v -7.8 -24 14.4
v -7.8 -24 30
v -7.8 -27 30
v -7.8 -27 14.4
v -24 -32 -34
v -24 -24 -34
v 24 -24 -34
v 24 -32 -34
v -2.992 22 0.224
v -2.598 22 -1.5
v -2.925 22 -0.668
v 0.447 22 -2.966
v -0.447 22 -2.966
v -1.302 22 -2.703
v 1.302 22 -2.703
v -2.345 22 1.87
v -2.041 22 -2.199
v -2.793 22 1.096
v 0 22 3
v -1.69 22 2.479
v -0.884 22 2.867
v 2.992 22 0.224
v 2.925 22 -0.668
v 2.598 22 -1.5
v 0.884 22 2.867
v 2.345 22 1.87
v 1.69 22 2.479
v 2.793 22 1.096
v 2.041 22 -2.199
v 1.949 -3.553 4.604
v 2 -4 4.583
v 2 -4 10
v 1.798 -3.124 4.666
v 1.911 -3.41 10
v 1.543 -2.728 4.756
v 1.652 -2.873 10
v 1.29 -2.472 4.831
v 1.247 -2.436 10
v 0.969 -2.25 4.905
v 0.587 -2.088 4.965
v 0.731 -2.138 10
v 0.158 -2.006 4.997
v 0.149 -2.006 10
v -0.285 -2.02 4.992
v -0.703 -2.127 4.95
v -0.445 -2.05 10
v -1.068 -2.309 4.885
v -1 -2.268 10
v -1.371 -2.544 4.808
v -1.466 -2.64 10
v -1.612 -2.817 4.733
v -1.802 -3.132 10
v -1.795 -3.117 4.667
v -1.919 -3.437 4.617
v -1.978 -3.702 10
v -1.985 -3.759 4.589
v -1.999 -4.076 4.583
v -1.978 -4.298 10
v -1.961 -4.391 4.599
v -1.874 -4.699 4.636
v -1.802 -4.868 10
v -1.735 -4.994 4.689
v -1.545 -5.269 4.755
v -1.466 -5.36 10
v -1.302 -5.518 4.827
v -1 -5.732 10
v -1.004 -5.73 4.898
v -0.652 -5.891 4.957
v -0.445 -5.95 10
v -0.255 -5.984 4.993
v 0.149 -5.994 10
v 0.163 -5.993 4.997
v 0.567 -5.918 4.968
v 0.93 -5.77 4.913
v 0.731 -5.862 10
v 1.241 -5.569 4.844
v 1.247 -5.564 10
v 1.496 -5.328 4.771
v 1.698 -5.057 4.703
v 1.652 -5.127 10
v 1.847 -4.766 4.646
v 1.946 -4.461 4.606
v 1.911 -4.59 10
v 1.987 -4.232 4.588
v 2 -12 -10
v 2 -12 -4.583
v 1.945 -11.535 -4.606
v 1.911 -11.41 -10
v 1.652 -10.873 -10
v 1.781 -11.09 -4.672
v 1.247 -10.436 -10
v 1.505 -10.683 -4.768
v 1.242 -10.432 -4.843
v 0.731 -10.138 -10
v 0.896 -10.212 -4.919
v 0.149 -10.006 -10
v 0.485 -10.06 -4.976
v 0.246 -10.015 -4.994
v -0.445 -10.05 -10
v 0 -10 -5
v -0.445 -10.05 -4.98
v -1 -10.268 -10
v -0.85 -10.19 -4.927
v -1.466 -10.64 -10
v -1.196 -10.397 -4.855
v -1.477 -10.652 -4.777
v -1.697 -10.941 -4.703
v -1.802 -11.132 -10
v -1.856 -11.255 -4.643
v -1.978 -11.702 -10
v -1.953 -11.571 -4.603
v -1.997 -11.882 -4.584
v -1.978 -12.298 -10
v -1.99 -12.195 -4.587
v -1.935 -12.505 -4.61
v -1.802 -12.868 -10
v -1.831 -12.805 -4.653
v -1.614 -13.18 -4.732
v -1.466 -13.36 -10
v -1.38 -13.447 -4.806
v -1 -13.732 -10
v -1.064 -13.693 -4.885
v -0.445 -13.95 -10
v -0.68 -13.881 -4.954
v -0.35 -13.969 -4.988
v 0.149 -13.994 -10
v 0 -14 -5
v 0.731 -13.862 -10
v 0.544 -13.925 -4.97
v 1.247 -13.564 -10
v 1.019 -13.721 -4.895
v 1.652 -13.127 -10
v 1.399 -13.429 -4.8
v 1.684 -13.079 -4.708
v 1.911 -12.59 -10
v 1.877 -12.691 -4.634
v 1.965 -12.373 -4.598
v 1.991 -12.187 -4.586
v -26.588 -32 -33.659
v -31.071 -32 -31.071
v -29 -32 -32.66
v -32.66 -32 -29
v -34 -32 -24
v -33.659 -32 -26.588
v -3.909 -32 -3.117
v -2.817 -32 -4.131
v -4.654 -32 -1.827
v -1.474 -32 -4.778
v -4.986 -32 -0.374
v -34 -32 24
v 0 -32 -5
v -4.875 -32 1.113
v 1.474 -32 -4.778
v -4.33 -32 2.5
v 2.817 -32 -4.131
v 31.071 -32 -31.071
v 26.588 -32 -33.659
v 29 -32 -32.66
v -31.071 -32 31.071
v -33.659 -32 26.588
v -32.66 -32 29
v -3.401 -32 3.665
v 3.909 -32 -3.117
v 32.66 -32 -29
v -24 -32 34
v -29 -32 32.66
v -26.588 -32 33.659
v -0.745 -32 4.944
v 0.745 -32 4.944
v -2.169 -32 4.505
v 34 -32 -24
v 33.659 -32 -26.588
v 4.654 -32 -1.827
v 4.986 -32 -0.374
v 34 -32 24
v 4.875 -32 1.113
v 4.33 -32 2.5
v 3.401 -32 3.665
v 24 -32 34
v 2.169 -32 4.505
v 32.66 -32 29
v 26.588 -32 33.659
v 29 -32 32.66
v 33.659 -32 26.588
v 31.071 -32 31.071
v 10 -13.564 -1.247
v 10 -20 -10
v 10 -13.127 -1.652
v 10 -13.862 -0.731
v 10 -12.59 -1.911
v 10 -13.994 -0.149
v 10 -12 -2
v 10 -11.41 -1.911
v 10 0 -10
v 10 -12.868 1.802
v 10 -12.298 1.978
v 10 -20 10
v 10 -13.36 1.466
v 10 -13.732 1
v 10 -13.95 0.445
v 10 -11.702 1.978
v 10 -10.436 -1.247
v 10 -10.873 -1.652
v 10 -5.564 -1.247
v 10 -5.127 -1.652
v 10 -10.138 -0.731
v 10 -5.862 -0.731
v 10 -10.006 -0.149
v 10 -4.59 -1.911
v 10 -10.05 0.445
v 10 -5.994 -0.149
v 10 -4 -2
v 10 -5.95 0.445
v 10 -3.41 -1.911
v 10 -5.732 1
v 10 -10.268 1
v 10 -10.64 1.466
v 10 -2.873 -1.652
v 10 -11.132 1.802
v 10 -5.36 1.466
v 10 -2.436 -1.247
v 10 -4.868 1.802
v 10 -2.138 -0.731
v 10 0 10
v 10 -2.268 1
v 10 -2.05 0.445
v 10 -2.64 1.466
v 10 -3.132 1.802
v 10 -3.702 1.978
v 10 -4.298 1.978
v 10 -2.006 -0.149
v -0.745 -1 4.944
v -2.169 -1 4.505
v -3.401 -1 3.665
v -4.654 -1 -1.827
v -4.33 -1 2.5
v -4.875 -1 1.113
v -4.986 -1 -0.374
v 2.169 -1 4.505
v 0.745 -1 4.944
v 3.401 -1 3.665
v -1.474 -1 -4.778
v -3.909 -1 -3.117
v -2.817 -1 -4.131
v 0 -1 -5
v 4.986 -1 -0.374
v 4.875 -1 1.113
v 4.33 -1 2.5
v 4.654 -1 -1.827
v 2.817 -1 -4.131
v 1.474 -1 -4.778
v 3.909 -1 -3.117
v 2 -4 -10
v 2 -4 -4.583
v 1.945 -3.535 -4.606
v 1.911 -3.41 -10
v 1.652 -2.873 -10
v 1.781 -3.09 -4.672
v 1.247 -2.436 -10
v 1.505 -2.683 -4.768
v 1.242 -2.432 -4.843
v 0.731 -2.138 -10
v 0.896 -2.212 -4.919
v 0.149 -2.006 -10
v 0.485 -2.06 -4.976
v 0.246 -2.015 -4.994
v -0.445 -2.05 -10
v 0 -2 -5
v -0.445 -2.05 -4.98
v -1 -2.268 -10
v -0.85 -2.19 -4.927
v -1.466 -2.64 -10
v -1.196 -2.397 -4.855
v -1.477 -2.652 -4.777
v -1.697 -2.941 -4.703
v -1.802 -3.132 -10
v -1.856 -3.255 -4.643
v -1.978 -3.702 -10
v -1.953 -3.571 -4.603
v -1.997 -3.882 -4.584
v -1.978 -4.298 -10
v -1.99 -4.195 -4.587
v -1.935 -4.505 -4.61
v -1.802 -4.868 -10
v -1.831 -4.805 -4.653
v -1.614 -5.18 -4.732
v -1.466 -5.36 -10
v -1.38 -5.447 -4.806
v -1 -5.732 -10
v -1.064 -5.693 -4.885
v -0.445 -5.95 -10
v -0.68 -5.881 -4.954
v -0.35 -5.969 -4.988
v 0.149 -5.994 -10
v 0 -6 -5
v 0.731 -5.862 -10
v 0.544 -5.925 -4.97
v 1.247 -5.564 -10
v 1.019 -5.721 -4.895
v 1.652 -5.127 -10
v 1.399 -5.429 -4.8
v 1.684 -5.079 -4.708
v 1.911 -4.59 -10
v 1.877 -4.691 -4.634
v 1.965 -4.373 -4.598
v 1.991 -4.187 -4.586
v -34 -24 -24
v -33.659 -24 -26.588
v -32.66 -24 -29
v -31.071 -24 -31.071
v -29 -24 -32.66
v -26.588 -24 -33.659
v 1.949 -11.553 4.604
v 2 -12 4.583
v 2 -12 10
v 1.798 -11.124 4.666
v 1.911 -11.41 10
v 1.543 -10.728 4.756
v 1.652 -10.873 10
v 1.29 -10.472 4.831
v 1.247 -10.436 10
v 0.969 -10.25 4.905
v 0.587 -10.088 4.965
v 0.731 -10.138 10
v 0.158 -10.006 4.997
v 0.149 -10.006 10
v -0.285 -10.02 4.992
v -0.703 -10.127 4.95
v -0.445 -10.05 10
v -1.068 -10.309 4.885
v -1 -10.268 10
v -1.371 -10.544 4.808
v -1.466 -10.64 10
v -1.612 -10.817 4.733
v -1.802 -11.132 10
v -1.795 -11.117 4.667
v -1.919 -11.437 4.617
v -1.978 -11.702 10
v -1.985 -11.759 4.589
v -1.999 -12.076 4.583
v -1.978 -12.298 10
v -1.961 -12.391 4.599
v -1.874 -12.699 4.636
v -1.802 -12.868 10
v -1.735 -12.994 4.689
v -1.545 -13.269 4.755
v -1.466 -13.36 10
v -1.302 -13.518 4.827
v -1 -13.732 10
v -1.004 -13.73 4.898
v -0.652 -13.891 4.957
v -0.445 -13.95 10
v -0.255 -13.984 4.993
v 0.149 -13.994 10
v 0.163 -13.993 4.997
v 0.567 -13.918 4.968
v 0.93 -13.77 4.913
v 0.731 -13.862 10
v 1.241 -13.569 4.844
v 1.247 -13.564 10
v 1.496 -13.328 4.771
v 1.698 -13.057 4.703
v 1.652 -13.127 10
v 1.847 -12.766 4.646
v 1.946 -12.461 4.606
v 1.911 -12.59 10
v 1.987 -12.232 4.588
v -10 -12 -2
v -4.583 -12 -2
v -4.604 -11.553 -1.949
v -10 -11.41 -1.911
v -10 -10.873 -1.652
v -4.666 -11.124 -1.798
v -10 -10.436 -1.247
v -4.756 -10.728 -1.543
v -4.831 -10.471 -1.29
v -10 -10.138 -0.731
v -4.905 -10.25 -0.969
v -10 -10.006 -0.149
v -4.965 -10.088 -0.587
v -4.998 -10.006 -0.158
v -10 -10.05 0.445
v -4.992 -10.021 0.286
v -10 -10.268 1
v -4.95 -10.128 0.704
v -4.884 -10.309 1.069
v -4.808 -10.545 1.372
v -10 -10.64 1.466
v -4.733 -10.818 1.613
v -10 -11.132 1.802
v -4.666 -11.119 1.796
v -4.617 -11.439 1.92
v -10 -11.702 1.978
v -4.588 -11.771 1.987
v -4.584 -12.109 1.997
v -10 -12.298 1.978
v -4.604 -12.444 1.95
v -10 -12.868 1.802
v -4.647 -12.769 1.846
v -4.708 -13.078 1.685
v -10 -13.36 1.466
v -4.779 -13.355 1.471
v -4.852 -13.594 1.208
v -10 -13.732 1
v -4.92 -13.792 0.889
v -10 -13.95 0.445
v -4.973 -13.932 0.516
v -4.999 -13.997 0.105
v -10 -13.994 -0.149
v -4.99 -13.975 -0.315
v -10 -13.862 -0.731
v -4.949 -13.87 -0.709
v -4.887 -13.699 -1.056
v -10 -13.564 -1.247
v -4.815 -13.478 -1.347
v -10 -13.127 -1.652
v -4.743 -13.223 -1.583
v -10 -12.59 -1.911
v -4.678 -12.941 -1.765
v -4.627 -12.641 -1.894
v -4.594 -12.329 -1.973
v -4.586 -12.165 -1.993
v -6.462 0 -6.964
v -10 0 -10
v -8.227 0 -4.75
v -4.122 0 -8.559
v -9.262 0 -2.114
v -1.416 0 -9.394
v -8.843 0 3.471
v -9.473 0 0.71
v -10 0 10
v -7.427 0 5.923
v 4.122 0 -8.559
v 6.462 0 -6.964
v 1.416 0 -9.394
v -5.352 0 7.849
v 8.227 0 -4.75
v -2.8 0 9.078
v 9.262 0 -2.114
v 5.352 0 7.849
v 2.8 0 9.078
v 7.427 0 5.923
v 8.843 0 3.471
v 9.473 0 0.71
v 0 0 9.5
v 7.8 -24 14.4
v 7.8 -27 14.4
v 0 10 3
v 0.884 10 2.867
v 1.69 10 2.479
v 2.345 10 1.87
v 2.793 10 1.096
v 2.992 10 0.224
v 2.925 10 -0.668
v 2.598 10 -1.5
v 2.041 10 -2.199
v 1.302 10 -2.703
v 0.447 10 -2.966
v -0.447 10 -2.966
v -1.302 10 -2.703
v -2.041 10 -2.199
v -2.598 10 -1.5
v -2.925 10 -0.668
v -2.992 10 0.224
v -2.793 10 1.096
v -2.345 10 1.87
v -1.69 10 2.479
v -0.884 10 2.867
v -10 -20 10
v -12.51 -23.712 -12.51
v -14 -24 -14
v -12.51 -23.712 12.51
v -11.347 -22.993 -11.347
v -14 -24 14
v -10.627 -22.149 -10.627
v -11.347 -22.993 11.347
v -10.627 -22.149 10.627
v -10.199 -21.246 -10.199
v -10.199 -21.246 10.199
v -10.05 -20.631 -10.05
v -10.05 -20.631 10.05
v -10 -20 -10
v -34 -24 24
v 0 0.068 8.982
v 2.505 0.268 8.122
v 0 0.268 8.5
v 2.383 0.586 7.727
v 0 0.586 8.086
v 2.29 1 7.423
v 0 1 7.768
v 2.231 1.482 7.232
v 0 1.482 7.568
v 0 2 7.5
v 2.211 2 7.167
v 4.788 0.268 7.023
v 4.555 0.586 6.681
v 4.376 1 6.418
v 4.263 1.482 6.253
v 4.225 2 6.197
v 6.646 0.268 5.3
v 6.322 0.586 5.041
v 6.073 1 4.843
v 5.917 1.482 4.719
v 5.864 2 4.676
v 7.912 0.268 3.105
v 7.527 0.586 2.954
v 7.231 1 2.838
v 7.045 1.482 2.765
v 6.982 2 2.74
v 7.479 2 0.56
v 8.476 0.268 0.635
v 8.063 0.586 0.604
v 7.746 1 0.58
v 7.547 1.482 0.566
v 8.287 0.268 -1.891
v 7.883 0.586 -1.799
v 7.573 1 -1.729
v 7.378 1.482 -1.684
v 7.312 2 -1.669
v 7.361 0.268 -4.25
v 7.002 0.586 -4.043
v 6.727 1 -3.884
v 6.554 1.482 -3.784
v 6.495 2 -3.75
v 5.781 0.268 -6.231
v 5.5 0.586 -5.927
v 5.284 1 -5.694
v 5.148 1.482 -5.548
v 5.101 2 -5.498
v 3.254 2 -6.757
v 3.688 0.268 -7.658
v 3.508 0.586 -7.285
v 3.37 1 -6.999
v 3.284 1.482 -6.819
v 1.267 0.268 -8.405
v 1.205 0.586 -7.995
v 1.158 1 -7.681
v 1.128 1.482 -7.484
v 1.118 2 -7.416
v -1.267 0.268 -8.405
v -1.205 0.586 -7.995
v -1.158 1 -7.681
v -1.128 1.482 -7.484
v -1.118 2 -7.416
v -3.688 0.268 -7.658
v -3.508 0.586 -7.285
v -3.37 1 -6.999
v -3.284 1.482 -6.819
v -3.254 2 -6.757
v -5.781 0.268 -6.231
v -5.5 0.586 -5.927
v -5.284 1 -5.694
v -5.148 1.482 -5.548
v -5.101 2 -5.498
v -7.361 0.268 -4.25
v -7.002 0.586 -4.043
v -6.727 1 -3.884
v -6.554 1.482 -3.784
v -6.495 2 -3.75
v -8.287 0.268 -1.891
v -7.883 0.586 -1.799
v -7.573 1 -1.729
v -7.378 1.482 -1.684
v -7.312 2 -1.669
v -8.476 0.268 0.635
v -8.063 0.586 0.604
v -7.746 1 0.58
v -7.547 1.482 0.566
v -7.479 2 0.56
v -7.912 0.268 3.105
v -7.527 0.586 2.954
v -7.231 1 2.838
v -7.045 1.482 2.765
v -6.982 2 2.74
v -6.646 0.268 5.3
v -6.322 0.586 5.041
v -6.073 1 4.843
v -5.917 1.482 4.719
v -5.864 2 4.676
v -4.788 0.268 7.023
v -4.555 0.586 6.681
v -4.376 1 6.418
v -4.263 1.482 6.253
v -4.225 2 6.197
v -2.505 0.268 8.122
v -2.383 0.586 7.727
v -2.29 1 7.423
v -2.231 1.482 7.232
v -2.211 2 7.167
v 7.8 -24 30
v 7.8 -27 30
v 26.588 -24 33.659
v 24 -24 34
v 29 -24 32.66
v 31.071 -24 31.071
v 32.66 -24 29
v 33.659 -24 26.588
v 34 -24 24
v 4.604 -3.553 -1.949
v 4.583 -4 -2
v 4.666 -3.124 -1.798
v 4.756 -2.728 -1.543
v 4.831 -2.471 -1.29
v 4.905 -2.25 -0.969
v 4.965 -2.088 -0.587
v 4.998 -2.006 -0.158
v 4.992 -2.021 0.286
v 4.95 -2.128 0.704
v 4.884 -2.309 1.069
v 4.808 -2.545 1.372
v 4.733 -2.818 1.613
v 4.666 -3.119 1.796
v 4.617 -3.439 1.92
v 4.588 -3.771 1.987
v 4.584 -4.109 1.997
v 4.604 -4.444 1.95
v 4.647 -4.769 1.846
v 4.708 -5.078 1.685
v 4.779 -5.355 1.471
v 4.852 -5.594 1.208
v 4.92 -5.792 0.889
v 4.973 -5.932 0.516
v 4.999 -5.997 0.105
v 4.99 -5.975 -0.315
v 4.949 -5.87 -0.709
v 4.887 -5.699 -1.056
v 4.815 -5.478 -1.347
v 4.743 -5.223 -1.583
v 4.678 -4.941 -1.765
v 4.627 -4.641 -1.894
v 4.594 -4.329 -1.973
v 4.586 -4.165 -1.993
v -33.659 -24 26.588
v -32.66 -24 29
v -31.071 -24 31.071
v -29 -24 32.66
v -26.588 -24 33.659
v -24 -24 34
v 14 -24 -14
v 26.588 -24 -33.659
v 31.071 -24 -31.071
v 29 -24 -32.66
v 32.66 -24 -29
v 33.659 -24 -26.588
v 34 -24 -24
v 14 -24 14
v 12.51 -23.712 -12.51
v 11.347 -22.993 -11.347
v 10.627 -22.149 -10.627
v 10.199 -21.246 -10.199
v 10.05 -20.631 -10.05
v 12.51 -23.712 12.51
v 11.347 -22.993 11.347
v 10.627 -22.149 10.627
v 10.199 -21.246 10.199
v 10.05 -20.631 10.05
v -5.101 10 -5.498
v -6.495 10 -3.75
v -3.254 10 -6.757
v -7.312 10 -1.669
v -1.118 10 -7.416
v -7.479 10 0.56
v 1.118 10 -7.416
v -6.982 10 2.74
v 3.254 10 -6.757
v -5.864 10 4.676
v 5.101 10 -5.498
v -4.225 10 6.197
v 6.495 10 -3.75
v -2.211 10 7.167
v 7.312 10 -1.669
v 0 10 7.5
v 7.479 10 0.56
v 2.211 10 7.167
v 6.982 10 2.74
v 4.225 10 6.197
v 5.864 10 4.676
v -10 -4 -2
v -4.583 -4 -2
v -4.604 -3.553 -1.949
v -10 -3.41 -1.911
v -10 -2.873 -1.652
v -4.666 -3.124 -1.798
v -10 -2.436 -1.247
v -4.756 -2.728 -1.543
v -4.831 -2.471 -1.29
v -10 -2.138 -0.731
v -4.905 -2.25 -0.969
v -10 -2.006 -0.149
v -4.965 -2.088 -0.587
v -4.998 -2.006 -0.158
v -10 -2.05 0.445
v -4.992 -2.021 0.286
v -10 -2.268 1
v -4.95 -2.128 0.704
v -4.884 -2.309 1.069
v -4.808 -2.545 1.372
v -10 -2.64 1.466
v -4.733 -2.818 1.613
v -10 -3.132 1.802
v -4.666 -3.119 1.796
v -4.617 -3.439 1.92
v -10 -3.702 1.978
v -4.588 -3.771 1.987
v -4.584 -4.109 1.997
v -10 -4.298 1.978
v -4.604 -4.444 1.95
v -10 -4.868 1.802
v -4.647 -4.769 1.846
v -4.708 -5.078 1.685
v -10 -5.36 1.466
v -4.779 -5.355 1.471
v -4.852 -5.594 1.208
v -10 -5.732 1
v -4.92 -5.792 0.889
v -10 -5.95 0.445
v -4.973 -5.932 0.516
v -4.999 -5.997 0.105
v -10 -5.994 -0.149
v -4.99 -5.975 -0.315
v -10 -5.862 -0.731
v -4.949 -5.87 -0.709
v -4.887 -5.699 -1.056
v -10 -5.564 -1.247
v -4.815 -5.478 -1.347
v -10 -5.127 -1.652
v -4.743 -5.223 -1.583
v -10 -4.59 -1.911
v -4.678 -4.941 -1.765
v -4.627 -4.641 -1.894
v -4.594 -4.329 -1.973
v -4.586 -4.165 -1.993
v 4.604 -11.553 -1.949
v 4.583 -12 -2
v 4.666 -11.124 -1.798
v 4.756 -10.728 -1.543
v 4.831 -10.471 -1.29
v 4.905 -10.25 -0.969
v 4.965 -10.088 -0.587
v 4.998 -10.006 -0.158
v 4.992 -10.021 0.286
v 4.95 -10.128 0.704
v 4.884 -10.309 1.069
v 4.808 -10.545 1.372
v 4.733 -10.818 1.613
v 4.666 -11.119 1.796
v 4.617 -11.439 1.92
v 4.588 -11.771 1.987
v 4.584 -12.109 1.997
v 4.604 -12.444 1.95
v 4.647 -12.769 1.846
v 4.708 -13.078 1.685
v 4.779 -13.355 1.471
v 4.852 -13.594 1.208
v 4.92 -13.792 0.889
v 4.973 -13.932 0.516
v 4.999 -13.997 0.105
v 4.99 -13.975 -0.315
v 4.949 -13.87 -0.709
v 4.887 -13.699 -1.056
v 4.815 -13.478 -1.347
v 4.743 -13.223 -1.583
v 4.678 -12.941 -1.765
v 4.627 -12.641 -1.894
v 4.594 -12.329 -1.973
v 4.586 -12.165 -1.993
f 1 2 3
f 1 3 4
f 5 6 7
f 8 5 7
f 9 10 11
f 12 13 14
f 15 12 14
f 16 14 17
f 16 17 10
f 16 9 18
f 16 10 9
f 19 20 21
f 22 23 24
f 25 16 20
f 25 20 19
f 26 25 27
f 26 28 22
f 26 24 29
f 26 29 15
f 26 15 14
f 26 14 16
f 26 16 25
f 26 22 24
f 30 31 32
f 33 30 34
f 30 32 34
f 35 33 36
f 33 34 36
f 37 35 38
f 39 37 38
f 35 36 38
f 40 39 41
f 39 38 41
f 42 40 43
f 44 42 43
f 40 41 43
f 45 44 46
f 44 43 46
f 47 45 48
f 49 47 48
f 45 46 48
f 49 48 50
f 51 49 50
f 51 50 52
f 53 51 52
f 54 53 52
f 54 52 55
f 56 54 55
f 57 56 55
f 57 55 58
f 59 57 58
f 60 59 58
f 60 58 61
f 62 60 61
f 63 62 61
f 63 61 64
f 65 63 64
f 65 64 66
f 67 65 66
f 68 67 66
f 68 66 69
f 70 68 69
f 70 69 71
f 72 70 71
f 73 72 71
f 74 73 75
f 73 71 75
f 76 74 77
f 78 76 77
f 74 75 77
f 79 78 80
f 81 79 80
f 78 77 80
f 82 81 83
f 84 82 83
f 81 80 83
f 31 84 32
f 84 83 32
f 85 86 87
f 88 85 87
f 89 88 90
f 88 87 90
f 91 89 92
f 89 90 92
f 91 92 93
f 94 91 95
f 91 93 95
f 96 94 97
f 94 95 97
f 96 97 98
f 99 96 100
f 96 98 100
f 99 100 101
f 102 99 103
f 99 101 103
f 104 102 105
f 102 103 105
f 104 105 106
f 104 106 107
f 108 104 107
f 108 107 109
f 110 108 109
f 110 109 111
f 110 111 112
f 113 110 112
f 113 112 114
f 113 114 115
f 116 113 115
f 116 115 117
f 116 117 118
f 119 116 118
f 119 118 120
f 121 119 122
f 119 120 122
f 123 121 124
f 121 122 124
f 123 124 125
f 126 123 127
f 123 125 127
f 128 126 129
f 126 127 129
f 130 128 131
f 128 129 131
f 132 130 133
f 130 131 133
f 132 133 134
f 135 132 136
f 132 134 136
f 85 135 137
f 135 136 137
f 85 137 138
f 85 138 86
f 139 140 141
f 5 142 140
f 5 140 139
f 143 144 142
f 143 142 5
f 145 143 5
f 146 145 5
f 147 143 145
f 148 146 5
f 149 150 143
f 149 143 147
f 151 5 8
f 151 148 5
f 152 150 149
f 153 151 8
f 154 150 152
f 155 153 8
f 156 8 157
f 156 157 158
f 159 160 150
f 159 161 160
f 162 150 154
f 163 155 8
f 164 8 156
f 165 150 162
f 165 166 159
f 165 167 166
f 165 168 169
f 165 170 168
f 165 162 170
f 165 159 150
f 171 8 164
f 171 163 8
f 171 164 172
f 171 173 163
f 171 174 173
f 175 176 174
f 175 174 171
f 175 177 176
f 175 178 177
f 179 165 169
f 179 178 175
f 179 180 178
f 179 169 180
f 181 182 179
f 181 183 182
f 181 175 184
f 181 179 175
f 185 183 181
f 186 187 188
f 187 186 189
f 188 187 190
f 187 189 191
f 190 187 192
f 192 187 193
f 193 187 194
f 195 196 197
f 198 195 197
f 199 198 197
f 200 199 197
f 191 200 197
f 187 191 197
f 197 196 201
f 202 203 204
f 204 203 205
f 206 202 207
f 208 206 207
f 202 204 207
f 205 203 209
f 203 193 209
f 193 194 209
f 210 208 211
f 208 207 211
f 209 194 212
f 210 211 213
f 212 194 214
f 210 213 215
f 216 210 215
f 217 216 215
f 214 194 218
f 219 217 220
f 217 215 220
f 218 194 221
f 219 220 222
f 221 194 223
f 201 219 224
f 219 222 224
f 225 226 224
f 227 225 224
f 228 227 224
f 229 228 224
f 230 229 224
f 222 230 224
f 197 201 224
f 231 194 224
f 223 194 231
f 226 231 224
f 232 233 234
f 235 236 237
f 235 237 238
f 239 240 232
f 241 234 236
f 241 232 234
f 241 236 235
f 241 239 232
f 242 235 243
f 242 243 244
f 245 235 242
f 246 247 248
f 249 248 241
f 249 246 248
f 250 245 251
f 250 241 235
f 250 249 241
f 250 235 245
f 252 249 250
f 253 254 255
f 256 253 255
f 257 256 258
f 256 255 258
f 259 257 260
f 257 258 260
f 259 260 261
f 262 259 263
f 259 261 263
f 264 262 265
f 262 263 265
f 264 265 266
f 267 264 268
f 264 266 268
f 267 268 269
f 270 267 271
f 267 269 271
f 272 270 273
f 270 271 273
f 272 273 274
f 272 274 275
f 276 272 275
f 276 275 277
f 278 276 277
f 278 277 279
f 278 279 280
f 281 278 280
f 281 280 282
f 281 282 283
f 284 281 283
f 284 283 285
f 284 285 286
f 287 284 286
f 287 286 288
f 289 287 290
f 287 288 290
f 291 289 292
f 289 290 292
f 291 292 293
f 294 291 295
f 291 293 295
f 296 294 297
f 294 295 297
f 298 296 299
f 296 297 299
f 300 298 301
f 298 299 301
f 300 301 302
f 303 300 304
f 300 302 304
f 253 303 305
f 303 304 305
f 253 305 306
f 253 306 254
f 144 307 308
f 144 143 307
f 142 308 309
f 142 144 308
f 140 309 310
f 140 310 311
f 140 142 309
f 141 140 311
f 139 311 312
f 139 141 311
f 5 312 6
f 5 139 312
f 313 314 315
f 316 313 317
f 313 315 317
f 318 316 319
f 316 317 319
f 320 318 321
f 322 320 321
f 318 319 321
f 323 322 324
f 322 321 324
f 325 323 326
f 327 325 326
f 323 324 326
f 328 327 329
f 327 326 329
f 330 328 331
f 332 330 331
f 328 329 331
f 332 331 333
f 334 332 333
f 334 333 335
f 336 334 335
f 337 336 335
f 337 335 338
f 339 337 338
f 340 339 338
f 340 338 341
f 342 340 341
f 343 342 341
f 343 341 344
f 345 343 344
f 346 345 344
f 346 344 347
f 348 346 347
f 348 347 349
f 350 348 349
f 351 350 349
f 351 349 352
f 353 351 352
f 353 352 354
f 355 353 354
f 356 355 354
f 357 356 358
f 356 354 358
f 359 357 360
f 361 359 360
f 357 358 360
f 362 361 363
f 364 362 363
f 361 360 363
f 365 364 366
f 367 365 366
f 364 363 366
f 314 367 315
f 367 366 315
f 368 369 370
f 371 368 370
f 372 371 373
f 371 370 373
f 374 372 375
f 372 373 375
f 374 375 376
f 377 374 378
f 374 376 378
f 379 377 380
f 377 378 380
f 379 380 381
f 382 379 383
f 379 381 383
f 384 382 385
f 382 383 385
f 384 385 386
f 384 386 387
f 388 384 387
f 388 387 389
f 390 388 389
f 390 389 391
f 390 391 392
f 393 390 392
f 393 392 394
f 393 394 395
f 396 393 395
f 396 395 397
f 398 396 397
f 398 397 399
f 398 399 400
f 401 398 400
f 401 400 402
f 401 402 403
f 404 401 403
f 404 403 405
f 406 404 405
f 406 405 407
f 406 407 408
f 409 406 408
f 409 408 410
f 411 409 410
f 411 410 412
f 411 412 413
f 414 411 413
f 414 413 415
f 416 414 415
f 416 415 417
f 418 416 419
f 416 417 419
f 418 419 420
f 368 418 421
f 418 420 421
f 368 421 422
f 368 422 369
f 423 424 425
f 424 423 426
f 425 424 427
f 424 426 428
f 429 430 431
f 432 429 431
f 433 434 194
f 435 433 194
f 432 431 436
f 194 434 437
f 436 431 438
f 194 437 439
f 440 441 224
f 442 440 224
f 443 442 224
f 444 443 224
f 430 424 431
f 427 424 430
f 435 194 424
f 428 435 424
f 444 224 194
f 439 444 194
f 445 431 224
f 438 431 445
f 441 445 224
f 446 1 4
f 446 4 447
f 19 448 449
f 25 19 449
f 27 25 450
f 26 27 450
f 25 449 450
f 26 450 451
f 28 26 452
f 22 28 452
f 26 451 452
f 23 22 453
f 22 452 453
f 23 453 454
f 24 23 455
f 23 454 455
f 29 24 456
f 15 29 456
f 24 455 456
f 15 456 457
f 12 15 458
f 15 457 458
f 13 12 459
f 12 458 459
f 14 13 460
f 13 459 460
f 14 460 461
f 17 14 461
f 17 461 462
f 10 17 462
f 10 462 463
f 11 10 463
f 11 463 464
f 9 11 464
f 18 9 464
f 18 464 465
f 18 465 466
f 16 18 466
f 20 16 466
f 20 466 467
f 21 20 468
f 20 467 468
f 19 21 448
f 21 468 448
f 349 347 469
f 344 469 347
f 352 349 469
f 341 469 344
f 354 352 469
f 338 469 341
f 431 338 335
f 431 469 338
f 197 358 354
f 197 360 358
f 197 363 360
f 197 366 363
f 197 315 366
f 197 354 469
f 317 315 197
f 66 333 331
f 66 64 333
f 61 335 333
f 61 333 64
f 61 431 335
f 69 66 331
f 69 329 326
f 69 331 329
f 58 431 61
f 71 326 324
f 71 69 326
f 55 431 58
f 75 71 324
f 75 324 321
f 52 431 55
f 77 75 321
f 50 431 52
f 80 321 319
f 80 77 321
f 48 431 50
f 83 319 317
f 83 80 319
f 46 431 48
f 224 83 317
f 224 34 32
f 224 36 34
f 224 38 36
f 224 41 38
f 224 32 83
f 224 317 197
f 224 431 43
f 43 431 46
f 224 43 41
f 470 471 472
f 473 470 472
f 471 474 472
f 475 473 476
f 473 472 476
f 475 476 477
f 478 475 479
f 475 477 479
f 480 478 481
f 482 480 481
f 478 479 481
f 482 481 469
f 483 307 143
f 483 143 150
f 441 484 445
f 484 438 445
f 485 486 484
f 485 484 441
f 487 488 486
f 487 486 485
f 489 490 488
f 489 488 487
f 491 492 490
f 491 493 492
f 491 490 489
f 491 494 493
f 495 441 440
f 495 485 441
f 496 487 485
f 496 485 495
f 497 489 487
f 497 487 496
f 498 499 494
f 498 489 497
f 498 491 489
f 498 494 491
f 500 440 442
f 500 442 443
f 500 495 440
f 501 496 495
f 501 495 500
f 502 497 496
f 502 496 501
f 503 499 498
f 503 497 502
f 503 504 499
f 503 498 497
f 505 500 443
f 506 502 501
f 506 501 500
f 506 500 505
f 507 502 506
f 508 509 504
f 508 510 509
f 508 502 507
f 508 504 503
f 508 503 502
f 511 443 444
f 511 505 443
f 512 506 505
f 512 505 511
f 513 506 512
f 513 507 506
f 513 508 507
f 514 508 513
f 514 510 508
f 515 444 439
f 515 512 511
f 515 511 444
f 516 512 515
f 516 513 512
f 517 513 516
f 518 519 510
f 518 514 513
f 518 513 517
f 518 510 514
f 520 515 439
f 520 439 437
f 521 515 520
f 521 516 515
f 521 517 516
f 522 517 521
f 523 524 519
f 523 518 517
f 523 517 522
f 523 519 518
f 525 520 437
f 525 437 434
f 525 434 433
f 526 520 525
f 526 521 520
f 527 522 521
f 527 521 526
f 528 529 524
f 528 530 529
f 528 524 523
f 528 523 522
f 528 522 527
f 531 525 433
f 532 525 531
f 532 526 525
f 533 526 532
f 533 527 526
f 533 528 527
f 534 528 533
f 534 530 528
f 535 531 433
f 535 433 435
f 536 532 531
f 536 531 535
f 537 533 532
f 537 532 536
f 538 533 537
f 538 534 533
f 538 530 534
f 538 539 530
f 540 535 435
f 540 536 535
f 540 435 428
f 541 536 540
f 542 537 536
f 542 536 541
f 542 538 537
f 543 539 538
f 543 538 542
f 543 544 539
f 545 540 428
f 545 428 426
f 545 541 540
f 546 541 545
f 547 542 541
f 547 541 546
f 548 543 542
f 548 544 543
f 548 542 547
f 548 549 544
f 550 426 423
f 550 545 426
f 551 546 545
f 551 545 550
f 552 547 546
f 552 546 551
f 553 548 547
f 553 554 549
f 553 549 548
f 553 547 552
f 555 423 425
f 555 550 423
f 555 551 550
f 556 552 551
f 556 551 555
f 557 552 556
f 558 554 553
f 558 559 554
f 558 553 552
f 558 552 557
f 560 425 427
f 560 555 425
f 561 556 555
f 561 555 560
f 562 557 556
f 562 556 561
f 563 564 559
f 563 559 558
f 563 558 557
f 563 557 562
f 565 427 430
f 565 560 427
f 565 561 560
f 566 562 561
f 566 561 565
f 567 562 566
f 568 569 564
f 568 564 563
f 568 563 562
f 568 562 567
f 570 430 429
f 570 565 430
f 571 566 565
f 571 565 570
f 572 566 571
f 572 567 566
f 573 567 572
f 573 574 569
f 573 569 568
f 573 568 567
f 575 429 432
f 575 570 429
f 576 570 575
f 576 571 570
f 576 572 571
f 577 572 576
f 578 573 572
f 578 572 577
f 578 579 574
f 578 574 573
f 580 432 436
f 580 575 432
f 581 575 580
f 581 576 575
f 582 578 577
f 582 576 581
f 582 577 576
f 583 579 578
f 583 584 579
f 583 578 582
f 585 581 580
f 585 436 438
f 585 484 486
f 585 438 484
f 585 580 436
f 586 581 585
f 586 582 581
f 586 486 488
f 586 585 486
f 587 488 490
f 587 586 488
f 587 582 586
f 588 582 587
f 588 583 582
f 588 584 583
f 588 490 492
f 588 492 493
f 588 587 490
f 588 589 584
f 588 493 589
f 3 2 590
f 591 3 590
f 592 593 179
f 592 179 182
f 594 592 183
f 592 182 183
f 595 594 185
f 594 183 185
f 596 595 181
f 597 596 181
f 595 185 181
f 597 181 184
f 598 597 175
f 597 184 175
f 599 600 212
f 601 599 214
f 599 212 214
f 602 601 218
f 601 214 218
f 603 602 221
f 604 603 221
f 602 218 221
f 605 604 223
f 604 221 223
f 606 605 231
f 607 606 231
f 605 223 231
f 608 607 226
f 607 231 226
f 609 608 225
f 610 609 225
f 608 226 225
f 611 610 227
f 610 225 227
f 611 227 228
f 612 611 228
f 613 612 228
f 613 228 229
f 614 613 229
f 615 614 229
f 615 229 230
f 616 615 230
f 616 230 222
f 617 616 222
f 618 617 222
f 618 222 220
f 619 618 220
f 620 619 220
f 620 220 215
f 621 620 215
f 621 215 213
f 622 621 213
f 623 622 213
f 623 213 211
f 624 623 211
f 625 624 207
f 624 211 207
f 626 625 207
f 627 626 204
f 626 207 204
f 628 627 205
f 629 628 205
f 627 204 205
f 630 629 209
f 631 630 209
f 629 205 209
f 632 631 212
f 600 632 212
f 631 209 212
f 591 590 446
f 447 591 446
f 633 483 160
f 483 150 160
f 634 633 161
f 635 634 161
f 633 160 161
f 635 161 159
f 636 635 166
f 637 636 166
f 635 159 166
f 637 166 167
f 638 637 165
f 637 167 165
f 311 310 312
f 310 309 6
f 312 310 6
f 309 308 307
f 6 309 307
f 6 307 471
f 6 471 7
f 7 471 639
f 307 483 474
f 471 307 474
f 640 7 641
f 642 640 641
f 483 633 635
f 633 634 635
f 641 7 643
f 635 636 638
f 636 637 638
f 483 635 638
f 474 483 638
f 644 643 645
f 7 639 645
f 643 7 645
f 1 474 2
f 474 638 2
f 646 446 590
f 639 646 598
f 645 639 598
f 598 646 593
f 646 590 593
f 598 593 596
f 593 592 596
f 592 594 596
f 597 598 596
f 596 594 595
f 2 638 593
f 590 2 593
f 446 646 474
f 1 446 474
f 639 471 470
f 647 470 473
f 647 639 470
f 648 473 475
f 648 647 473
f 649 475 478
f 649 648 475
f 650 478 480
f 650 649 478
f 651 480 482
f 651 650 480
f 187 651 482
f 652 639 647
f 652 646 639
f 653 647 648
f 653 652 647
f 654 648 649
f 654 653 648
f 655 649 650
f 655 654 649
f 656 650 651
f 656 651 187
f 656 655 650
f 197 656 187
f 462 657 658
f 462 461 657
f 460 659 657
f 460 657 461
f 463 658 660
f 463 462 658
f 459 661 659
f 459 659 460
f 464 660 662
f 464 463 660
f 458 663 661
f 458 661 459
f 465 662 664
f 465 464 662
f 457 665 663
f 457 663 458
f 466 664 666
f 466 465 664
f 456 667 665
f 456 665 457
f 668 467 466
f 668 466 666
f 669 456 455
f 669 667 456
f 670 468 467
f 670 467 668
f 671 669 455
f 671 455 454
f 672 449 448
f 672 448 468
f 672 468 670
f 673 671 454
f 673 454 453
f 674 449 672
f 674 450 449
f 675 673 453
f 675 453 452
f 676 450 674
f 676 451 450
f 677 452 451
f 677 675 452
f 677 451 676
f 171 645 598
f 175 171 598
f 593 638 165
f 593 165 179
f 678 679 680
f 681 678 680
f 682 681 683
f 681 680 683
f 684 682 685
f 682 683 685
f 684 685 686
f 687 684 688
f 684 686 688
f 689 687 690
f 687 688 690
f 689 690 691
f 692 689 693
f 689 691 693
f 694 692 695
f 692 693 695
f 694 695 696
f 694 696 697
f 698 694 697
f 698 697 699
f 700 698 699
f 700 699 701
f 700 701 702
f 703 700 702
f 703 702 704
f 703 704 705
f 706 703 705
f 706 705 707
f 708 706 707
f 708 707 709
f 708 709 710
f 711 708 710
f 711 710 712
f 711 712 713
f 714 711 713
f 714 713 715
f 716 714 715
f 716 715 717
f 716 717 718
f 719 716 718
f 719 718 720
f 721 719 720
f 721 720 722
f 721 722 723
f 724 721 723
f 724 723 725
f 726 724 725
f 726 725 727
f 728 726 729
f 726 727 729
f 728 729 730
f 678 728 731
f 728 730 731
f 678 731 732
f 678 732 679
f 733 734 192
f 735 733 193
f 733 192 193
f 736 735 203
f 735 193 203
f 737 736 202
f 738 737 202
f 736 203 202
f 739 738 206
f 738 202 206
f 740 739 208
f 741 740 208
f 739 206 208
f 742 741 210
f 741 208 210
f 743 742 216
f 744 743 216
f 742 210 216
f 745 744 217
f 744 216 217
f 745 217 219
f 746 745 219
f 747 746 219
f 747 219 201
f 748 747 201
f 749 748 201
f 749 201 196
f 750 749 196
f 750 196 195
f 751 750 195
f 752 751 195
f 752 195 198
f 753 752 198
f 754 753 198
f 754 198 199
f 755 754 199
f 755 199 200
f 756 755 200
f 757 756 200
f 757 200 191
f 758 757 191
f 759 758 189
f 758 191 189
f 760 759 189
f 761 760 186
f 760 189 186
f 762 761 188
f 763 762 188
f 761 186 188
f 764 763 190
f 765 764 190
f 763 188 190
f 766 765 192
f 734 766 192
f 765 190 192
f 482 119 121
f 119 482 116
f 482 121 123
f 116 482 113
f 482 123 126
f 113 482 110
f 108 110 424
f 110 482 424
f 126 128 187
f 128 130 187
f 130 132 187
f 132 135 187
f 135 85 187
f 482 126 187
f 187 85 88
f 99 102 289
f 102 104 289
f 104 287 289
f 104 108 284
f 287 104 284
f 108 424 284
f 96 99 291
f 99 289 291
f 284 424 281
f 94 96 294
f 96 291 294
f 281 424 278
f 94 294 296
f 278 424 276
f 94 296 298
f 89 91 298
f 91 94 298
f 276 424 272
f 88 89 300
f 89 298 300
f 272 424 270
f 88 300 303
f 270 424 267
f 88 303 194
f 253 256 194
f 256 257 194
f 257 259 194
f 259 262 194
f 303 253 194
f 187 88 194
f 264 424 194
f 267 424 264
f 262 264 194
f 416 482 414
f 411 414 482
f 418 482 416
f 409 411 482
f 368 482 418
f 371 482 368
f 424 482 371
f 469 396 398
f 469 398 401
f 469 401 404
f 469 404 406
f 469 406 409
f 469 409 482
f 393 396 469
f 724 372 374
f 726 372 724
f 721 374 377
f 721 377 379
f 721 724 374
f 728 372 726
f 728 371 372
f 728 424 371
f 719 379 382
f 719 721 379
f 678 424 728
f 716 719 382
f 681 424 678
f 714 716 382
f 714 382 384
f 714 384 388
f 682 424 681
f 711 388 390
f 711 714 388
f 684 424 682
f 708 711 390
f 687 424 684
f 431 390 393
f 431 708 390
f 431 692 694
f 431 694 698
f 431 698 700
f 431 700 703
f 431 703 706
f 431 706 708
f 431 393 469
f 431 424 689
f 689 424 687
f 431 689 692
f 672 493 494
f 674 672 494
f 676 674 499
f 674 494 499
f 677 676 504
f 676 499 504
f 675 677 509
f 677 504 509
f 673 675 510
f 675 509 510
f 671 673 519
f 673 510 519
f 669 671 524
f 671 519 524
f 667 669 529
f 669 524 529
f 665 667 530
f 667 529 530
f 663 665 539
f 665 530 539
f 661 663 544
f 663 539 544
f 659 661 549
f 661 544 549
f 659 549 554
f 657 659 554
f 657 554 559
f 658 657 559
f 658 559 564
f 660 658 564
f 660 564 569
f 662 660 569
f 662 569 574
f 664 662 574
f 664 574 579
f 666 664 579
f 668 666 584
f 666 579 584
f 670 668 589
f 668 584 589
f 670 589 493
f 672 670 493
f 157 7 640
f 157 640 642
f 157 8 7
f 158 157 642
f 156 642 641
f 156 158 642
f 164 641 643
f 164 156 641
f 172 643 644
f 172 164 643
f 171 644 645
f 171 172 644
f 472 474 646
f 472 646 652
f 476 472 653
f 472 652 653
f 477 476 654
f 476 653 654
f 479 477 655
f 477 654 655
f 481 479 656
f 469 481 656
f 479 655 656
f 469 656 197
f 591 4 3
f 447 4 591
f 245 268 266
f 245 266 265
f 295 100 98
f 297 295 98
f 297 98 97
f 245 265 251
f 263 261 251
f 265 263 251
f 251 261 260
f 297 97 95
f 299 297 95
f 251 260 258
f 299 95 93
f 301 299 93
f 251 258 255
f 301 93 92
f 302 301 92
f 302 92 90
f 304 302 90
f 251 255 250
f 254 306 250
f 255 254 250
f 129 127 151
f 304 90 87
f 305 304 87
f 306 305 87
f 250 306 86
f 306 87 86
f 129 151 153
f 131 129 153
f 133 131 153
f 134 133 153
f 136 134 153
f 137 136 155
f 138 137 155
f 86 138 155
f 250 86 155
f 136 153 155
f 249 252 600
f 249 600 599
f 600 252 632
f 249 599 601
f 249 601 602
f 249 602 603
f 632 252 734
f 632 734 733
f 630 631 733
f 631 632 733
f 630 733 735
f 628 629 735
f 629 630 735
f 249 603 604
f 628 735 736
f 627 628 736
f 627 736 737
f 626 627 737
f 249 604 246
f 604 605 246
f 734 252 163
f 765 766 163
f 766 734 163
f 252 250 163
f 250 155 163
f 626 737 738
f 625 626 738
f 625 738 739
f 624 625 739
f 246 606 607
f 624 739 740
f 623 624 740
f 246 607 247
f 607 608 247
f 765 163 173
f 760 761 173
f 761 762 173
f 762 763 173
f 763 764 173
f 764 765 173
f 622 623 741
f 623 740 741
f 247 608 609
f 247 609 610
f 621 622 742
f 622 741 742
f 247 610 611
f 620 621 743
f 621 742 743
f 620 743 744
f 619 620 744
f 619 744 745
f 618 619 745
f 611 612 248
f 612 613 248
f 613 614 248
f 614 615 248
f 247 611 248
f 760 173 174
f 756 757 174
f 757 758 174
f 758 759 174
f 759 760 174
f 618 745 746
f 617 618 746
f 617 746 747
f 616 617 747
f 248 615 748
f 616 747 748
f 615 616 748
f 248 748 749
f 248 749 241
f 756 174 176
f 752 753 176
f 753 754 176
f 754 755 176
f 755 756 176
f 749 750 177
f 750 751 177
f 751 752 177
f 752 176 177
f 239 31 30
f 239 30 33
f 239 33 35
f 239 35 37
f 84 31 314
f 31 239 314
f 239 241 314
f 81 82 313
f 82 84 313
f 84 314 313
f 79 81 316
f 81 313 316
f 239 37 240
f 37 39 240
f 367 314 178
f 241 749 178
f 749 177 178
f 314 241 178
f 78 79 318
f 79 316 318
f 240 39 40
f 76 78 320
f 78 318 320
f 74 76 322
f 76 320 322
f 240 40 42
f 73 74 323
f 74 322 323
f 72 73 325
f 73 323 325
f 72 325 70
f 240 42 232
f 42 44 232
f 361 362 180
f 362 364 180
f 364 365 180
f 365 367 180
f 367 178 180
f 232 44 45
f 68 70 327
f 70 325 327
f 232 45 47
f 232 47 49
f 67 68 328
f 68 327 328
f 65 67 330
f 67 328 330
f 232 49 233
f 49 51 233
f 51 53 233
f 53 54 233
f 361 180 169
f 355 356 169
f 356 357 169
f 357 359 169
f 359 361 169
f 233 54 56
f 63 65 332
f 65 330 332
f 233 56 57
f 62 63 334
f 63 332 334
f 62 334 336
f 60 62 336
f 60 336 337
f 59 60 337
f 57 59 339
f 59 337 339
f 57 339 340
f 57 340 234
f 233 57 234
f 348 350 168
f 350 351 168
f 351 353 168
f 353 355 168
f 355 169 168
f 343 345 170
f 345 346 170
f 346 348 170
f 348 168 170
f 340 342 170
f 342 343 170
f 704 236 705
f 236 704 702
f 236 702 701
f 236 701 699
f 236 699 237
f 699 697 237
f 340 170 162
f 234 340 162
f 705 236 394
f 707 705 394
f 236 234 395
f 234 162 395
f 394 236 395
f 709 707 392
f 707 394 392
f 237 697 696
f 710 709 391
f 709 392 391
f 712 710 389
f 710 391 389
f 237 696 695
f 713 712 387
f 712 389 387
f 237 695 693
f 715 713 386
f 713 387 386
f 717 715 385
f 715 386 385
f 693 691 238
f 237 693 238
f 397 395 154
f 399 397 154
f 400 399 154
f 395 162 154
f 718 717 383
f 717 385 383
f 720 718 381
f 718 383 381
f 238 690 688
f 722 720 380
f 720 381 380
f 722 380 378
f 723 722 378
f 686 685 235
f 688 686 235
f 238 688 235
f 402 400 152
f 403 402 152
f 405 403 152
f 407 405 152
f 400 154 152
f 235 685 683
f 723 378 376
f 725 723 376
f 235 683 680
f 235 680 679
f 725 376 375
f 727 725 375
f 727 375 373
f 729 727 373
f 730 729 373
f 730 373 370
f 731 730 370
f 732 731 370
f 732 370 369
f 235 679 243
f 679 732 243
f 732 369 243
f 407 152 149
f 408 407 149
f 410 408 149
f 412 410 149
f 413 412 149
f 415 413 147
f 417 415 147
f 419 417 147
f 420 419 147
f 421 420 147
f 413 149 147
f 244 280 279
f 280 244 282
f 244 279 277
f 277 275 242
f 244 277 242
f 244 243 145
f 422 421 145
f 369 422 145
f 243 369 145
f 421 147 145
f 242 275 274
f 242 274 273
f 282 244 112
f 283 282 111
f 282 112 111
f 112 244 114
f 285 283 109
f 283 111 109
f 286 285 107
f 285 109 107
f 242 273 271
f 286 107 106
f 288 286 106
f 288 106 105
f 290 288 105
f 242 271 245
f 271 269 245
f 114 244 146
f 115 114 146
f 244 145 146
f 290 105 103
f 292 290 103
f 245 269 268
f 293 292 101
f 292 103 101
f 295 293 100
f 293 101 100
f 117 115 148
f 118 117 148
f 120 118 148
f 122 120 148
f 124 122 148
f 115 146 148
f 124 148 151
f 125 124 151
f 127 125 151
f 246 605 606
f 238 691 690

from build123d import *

# Parameters (mm, degrees)
SKETCH_1_R               = 7.5
EXTRUDE_1_DEPTH          = 10
SKETCH_2_W               = 20
SKETCH_2_H               = 20
EXTRUDE_2_DEPTH          = 24
SKETCH_3_W               = 68
SKETCH_3_H               = 68
EXTRUDE_3_DEPTH          = 8
FILLET_1_R               = 10
SKETCH_4_R               = 2
CUT_EXTRUDE_1_DEPTH      = 23
PATTERN_CIRCULAR_1_COUNT = 2
PATTERN_CIRCULAR_1_ANGLE = 90
SKETCH_5_R               = 5
CUT_EXTRUDE_2_DEPTH      = 31
FILLET_3_R               = 4
SKETCH_6_W               = 15.6
SKETCH_6_H               = 15.6
CUT_EXTRUDE_3_DEPTH      = 3
SKETCH_7_R               = 3
EXTRUDE_4_DEPTH          = 12
FILLET_4_R               = 2


with BuildPart() as part:
    # 草图1 → 凸台-拉伸1 (new body)
    with BuildSketch(Plane(origin=(0, 0, 0), x_dir=(1, 0, 0), z_dir=(0, 1, 0))):
        with Locations(Location((0, 0, 0), (0, 0, 270))):
            Circle(SKETCH_1_R)
    extrude(amount=EXTRUDE_1_DEPTH)

    # 草图2 → 凸台-拉伸2 (add)
    with BuildSketch(Plane.XZ):
        Rectangle(SKETCH_2_W, SKETCH_2_H)
    extrude(amount=EXTRUDE_2_DEPTH)

    # 草图3 → 凸台-拉伸3 (add)
    with BuildSketch(Plane.XZ.offset(24)):
        Rectangle(SKETCH_3_W, SKETCH_3_H)
    extrude(amount=EXTRUDE_3_DEPTH)

    # 圆角1
    fillet_1_edges = [part.edges().sort_by_distance(p)[0] for p in [
        (34, -28, -34),
        (34, -28, 34),
        (-34, -28, 34),
        (-34, -28, -34),
    ]]
    fillet(fillet_1_edges, radius=FILLET_1_R)

    # 草图4 → 切除-拉伸1 (cut)
    with BuildSketch(Plane(origin=(10, 0, 0), x_dir=(0, 0, -1), z_dir=(1, 0, 0))):
        with Locations((0, -4)):
            Circle(SKETCH_4_R)
        with Locations((0, -12)):
            Circle(SKETCH_4_R)
    cut_extrude_1 = extrude(amount=-CUT_EXTRUDE_1_DEPTH, mode=Mode.SUBTRACT)

    # 阵列(圆周)1: 切除-拉伸1 ×2 about axis
    pattern_circular_1_axis = Axis((0, 10, 0), (0, -1, 0))
    for i in range(1, PATTERN_CIRCULAR_1_COUNT):
        add(cut_extrude_1.rotate(pattern_circular_1_axis, i * PATTERN_CIRCULAR_1_ANGLE / (PATTERN_CIRCULAR_1_COUNT - 1)), mode=Mode.SUBTRACT)

    # 草图5 → 切除-拉伸2 (cut)
    with BuildSketch(Plane.XZ.offset(32)):
        with Locations(Location((0, 0, 0), (0, 0, 270))):
            Circle(SKETCH_5_R)
    extrude(amount=-CUT_EXTRUDE_2_DEPTH, mode=Mode.SUBTRACT)

    # 圆角3
    fillet_3_edges = [part.edges().sort_by_distance(p)[0] for p in [
        (10, -24, 0),
        (0, -24, 10),
        (-10, -24, 0),
        (0, -24, -10),
    ]]
    fillet(fillet_3_edges, radius=FILLET_3_R)

    # 草图6 → 切除-拉伸3 (cut)
    with BuildSketch(Plane(origin=(0, -24, 0), x_dir=(1, 0, 0), z_dir=(0, 1, 0))):
        with Locations((0, -22.2)):
            Rectangle(SKETCH_6_W, SKETCH_6_H)
    extrude(amount=-CUT_EXTRUDE_3_DEPTH, mode=Mode.SUBTRACT)

    # 草图7 → 凸台-拉伸4 (add)
    with BuildSketch(Plane(origin=(0, 10, 0), x_dir=(1, 0, 0), z_dir=(0, 1, 0))):
        with Locations(Location((0, 0, 0), (0, 0, 270))):
            Circle(SKETCH_7_R)
    extrude(amount=EXTRUDE_4_DEPTH)

    # 圆角4
    fillet_4_edges = [part.edges().sort_by_distance(p)[0] for p in [
        (0, 0, -7.5),
    ]]
    fillet(fillet_4_edges, radius=FILLET_4_R)


solid = part.part
